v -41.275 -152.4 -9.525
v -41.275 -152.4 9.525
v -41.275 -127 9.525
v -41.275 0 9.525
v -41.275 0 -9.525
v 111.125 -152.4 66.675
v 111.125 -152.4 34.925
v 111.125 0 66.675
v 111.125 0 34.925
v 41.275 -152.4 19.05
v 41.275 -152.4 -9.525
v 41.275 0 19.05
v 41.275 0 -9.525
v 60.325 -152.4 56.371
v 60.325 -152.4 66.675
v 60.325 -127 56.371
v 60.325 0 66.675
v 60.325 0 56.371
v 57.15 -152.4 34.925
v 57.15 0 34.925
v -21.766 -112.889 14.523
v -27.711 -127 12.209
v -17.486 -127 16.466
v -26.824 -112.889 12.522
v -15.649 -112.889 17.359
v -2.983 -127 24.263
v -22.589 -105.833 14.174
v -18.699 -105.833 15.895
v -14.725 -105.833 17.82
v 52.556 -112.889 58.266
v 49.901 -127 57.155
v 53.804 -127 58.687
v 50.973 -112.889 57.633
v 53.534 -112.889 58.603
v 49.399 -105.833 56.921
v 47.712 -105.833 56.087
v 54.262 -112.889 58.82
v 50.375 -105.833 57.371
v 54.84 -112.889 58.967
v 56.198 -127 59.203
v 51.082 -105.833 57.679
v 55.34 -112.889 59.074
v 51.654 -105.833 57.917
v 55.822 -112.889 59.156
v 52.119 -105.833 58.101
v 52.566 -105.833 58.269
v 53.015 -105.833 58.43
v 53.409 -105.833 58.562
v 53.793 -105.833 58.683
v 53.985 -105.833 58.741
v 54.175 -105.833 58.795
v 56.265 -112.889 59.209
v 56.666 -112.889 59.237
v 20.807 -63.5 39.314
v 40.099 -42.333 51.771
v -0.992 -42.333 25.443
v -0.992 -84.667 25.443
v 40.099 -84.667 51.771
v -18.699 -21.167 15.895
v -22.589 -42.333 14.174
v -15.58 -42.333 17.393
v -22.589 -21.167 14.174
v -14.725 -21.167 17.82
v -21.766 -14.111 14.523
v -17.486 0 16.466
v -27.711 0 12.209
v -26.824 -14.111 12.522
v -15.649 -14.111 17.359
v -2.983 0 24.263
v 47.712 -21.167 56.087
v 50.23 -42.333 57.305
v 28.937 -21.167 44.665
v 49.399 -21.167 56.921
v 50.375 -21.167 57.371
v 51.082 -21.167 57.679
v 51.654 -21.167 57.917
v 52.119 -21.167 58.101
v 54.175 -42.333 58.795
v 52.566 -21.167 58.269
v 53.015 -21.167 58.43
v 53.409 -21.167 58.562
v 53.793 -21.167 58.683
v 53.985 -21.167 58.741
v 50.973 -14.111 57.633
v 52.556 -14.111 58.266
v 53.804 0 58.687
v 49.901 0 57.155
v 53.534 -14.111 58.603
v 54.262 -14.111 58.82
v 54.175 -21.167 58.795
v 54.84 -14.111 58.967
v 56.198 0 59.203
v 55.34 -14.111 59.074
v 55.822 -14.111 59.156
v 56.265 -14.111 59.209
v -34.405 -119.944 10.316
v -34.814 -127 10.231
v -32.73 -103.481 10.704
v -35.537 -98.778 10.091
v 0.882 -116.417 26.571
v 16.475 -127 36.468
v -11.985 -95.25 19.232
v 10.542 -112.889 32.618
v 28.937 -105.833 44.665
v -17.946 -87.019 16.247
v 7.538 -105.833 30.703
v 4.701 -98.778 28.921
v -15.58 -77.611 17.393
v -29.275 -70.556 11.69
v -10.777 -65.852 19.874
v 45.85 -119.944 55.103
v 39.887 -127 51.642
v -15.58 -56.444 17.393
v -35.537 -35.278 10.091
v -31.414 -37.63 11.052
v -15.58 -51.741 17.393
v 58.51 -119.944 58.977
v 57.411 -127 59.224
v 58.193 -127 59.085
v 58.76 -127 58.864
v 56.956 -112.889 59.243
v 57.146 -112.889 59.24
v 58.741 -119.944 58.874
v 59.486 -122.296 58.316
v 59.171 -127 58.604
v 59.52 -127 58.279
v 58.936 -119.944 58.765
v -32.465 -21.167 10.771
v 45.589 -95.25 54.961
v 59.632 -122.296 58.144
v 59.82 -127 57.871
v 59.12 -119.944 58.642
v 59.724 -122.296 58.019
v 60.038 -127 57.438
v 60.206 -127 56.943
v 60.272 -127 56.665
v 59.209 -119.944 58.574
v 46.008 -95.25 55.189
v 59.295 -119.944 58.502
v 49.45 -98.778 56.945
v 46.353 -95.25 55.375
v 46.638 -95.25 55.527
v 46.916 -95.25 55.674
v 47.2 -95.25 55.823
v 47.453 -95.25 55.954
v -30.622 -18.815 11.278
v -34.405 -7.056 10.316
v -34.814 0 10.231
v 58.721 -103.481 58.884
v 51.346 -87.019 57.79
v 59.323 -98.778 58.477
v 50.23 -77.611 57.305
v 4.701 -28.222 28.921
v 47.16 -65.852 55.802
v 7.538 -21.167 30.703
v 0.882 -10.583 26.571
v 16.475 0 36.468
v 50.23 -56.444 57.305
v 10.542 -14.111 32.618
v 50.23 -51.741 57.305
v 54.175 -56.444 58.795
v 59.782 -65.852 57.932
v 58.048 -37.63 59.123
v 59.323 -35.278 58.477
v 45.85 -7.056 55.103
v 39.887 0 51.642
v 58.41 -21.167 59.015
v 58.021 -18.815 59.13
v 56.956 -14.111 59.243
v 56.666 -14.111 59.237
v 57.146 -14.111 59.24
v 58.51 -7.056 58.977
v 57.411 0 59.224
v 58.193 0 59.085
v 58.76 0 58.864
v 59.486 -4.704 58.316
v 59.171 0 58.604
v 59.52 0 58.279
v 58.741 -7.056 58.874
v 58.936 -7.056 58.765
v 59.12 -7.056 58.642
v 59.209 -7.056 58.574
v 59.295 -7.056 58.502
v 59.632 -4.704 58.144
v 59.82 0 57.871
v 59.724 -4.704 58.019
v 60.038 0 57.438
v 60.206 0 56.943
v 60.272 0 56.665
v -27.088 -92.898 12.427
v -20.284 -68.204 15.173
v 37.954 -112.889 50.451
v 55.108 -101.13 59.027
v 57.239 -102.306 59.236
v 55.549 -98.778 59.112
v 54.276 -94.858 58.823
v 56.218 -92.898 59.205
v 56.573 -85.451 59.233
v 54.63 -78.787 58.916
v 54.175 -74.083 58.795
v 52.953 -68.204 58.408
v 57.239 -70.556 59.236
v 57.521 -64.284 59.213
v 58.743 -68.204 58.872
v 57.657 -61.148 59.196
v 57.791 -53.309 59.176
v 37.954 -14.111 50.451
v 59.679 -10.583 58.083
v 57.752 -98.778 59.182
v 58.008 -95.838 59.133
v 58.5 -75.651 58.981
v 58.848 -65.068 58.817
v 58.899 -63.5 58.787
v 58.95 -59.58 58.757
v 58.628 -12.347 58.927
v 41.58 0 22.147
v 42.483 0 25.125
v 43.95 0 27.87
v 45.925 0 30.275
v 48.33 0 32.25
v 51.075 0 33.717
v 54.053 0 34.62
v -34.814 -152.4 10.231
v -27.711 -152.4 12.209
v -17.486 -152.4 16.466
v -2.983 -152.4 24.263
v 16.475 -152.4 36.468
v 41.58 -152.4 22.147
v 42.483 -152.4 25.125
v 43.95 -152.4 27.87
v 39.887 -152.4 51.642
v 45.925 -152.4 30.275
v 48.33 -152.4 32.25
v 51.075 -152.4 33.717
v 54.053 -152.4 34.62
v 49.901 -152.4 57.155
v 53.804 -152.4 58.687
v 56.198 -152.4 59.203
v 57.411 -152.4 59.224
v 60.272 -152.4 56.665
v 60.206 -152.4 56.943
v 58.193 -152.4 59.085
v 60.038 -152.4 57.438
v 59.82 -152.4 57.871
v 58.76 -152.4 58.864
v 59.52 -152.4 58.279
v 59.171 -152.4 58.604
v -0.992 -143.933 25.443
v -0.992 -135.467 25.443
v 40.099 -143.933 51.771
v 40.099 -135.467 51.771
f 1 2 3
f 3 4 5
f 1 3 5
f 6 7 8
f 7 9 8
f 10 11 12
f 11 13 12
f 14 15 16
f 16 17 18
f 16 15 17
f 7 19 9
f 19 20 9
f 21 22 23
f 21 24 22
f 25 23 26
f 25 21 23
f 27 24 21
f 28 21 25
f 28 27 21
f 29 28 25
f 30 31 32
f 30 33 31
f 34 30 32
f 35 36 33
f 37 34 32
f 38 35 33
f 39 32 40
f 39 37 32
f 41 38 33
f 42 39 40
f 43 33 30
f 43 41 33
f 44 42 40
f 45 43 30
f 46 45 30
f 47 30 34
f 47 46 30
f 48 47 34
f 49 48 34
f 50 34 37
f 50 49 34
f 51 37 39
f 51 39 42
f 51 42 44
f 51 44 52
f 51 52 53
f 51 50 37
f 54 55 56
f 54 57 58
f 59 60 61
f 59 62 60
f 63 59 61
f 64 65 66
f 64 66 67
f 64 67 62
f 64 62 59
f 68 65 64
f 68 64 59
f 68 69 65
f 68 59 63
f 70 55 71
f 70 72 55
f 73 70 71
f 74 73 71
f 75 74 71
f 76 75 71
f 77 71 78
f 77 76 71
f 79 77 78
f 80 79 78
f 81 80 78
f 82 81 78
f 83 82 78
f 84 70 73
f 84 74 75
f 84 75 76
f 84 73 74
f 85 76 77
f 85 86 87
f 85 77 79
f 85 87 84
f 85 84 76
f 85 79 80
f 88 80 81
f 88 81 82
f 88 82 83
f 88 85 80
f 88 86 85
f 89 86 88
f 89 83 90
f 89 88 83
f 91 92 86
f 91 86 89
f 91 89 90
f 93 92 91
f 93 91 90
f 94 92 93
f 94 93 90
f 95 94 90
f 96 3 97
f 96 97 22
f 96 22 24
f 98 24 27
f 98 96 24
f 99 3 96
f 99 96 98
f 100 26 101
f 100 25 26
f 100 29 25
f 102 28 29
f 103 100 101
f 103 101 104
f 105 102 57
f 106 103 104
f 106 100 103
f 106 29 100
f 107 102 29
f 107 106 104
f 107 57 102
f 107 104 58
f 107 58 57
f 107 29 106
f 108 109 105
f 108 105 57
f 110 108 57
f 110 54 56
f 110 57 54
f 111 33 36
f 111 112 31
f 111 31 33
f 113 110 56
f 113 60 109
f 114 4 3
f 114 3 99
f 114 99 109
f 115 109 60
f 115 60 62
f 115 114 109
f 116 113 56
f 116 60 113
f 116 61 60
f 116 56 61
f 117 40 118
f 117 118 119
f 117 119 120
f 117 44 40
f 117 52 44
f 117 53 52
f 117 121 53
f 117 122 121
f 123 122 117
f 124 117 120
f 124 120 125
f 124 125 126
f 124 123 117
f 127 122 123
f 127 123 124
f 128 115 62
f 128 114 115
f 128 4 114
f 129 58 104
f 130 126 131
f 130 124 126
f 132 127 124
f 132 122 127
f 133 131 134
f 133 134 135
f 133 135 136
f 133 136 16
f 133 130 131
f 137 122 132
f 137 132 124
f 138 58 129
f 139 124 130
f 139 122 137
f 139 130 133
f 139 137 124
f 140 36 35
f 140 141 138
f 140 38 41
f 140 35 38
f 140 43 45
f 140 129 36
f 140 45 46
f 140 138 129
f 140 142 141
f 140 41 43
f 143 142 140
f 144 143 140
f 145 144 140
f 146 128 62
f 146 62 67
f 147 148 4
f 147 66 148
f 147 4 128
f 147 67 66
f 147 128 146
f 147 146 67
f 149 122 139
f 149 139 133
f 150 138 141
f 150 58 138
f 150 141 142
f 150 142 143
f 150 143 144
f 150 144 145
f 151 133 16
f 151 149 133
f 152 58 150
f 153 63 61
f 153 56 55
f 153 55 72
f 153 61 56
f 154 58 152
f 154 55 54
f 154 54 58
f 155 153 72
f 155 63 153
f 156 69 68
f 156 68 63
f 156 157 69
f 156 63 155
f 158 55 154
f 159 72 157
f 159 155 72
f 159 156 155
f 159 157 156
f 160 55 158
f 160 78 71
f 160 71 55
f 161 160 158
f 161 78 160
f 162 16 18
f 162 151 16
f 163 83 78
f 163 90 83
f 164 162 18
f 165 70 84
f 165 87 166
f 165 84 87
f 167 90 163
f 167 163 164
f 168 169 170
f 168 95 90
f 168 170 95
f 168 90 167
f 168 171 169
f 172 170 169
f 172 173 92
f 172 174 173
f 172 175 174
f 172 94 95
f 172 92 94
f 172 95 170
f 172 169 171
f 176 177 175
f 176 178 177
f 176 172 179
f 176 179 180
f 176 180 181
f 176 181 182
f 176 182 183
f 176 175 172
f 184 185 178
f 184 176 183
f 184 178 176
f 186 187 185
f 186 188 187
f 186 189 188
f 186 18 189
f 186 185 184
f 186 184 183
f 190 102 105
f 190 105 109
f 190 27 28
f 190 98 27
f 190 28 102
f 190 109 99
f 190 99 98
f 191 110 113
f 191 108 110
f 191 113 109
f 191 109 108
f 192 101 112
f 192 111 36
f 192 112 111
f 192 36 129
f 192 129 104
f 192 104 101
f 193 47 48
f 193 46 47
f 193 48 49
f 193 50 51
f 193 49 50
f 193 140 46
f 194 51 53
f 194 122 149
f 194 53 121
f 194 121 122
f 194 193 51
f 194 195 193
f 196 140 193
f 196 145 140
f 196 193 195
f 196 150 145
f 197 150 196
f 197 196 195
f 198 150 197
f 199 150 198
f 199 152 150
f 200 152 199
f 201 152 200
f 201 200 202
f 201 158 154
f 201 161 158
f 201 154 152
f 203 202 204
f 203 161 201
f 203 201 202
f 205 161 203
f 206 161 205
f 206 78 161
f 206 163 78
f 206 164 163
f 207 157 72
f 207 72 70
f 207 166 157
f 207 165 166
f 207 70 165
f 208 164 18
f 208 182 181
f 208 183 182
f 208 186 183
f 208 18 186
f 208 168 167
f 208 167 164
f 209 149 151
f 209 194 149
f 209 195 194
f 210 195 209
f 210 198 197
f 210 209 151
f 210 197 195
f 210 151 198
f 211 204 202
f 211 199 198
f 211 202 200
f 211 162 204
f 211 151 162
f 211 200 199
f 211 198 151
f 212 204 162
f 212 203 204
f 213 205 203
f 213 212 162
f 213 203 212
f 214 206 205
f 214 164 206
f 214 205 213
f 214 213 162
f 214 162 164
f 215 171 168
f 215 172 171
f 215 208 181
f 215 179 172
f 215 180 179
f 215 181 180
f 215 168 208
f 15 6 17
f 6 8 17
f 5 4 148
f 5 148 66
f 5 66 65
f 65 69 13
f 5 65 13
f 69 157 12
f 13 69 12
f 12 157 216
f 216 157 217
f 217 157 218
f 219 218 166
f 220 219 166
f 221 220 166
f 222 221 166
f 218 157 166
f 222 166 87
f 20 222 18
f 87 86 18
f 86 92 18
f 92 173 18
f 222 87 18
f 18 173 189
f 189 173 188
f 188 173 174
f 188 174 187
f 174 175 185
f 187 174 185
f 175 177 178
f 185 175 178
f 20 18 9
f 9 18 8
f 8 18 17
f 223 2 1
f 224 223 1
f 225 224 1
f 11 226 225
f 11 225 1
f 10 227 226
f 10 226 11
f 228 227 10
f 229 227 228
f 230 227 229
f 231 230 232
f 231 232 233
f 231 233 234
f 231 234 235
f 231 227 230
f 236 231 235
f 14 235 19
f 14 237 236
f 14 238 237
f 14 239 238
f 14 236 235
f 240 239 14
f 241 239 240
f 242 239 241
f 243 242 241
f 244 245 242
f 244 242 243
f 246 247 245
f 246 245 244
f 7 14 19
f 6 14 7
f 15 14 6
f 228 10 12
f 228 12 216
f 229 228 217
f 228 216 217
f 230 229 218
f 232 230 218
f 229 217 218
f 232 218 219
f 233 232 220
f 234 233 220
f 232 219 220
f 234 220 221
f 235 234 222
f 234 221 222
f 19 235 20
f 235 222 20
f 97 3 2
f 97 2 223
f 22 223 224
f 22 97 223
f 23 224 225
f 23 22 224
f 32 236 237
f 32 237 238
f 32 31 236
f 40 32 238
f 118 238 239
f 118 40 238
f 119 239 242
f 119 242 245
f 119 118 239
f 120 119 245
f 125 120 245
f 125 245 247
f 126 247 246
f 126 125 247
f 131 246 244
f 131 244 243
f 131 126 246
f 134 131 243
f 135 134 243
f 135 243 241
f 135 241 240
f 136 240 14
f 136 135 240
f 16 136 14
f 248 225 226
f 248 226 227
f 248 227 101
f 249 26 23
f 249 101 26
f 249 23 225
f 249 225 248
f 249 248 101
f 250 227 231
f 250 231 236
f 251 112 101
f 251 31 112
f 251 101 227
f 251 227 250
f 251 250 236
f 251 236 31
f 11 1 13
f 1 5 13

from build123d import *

# Parameters (mm, degrees)
F1_DEPTH = 127
F2_DEPTH = 25.4


with BuildPart() as f1:
    # F0 (on Front) → F1 (new body)
    with BuildSketch(Plane.XZ):
        Polygon((-41.275, 9.525), (-41.275, -9.525), (41.275, -9.525), (41.275, 9.525), (22.225, 9.525), align=None)
        with BuildLine():
            add(Edge.make_bspline(
                [(-41.275, 9.525), (-8.6202568682, 9.525), (57.7562975598, 73.3467516444), (60.325, 56.3711255966)],
                knots=[0, 0, 0, 0, 106.6877251483, 106.6877251483, 106.6877251483, 106.6877251483], degree=3))
            Line((-41.275, 9.525), (22.225, 9.525))
            Line((22.225, 9.525), (22.225, 19.05))
            ThreePointArc((22.225, 19.05), (32.4542956671, 43.7457043329), (57.15, 53.975))
            Line((57.15, 53.975), (60.325, 53.975))
            Line((60.325, 53.975), (60.325, 56.3711255966))
        make_face()
        with BuildLine():
            Line((22.225, 9.525), (41.275, 9.525))
            Line((41.275, 9.525), (41.275, 19.05))
            ThreePointArc((41.275, 19.05), (45.9246798487, 30.2753201513), (57.15, 34.925))
            Line((57.15, 34.925), (60.325, 34.925))
            Line((60.325, 34.925), (60.325, 53.975))
            Line((60.325, 53.975), (57.15, 53.975))
            ThreePointArc((57.15, 53.975), (32.4542956671, 43.7457043329), (22.225, 19.05))
            Line((22.225, 19.05), (22.225, 9.525))
        make_face()
        with BuildLine():
            add(Edge.make_bspline(
                [(60.325, 56.3711255966), (60.4263696567, 55.7012101725), (60.4283676683, 54.9054643358), (60.325, 53.975)],
                knots=[106.6877251483, 106.6877251483, 106.6877251483, 106.6877251483, 110.8979823982, 110.8979823982, 110.8979823982, 110.8979823982], degree=3))
            Line((60.325, 56.3711255966), (60.325, 53.975))
        make_face()
        with BuildLine():
            Line((60.325, 66.675), (60.325, 56.3711255966))
            add(Edge.make_bspline(
                [(60.325, 56.3711255966), (60.4263696567, 55.7012101725), (60.4283676683, 54.9054643358), (60.325, 53.975)],
                knots=[106.6877251483, 106.6877251483, 106.6877251483, 106.6877251483, 110.8979823982, 110.8979823982, 110.8979823982, 110.8979823982], degree=3))
            Line((60.325, 53.975), (60.325, 34.925))
            Line((60.325, 34.925), (73.2388391052, 34.925))
            Line((73.2388391052, 34.925), (111.125, 34.925))
            Line((111.125, 34.925), (111.125, 66.675))
            Line((111.125, 66.675), (60.325, 66.675))
        make_face()
    extrude(amount=F1_DEPTH)

    # F2 (add): faces of the model
    f2_faces = [f1.faces().sort_by_distance(p)[0] for p in [
        (36.5781101492, -127, 26.7856673902),
        (36.5781101492, -127, 26.7856673902),
    ]]
    extrude(f2_faces, amount=F2_DEPTH)


solid = f1.part
